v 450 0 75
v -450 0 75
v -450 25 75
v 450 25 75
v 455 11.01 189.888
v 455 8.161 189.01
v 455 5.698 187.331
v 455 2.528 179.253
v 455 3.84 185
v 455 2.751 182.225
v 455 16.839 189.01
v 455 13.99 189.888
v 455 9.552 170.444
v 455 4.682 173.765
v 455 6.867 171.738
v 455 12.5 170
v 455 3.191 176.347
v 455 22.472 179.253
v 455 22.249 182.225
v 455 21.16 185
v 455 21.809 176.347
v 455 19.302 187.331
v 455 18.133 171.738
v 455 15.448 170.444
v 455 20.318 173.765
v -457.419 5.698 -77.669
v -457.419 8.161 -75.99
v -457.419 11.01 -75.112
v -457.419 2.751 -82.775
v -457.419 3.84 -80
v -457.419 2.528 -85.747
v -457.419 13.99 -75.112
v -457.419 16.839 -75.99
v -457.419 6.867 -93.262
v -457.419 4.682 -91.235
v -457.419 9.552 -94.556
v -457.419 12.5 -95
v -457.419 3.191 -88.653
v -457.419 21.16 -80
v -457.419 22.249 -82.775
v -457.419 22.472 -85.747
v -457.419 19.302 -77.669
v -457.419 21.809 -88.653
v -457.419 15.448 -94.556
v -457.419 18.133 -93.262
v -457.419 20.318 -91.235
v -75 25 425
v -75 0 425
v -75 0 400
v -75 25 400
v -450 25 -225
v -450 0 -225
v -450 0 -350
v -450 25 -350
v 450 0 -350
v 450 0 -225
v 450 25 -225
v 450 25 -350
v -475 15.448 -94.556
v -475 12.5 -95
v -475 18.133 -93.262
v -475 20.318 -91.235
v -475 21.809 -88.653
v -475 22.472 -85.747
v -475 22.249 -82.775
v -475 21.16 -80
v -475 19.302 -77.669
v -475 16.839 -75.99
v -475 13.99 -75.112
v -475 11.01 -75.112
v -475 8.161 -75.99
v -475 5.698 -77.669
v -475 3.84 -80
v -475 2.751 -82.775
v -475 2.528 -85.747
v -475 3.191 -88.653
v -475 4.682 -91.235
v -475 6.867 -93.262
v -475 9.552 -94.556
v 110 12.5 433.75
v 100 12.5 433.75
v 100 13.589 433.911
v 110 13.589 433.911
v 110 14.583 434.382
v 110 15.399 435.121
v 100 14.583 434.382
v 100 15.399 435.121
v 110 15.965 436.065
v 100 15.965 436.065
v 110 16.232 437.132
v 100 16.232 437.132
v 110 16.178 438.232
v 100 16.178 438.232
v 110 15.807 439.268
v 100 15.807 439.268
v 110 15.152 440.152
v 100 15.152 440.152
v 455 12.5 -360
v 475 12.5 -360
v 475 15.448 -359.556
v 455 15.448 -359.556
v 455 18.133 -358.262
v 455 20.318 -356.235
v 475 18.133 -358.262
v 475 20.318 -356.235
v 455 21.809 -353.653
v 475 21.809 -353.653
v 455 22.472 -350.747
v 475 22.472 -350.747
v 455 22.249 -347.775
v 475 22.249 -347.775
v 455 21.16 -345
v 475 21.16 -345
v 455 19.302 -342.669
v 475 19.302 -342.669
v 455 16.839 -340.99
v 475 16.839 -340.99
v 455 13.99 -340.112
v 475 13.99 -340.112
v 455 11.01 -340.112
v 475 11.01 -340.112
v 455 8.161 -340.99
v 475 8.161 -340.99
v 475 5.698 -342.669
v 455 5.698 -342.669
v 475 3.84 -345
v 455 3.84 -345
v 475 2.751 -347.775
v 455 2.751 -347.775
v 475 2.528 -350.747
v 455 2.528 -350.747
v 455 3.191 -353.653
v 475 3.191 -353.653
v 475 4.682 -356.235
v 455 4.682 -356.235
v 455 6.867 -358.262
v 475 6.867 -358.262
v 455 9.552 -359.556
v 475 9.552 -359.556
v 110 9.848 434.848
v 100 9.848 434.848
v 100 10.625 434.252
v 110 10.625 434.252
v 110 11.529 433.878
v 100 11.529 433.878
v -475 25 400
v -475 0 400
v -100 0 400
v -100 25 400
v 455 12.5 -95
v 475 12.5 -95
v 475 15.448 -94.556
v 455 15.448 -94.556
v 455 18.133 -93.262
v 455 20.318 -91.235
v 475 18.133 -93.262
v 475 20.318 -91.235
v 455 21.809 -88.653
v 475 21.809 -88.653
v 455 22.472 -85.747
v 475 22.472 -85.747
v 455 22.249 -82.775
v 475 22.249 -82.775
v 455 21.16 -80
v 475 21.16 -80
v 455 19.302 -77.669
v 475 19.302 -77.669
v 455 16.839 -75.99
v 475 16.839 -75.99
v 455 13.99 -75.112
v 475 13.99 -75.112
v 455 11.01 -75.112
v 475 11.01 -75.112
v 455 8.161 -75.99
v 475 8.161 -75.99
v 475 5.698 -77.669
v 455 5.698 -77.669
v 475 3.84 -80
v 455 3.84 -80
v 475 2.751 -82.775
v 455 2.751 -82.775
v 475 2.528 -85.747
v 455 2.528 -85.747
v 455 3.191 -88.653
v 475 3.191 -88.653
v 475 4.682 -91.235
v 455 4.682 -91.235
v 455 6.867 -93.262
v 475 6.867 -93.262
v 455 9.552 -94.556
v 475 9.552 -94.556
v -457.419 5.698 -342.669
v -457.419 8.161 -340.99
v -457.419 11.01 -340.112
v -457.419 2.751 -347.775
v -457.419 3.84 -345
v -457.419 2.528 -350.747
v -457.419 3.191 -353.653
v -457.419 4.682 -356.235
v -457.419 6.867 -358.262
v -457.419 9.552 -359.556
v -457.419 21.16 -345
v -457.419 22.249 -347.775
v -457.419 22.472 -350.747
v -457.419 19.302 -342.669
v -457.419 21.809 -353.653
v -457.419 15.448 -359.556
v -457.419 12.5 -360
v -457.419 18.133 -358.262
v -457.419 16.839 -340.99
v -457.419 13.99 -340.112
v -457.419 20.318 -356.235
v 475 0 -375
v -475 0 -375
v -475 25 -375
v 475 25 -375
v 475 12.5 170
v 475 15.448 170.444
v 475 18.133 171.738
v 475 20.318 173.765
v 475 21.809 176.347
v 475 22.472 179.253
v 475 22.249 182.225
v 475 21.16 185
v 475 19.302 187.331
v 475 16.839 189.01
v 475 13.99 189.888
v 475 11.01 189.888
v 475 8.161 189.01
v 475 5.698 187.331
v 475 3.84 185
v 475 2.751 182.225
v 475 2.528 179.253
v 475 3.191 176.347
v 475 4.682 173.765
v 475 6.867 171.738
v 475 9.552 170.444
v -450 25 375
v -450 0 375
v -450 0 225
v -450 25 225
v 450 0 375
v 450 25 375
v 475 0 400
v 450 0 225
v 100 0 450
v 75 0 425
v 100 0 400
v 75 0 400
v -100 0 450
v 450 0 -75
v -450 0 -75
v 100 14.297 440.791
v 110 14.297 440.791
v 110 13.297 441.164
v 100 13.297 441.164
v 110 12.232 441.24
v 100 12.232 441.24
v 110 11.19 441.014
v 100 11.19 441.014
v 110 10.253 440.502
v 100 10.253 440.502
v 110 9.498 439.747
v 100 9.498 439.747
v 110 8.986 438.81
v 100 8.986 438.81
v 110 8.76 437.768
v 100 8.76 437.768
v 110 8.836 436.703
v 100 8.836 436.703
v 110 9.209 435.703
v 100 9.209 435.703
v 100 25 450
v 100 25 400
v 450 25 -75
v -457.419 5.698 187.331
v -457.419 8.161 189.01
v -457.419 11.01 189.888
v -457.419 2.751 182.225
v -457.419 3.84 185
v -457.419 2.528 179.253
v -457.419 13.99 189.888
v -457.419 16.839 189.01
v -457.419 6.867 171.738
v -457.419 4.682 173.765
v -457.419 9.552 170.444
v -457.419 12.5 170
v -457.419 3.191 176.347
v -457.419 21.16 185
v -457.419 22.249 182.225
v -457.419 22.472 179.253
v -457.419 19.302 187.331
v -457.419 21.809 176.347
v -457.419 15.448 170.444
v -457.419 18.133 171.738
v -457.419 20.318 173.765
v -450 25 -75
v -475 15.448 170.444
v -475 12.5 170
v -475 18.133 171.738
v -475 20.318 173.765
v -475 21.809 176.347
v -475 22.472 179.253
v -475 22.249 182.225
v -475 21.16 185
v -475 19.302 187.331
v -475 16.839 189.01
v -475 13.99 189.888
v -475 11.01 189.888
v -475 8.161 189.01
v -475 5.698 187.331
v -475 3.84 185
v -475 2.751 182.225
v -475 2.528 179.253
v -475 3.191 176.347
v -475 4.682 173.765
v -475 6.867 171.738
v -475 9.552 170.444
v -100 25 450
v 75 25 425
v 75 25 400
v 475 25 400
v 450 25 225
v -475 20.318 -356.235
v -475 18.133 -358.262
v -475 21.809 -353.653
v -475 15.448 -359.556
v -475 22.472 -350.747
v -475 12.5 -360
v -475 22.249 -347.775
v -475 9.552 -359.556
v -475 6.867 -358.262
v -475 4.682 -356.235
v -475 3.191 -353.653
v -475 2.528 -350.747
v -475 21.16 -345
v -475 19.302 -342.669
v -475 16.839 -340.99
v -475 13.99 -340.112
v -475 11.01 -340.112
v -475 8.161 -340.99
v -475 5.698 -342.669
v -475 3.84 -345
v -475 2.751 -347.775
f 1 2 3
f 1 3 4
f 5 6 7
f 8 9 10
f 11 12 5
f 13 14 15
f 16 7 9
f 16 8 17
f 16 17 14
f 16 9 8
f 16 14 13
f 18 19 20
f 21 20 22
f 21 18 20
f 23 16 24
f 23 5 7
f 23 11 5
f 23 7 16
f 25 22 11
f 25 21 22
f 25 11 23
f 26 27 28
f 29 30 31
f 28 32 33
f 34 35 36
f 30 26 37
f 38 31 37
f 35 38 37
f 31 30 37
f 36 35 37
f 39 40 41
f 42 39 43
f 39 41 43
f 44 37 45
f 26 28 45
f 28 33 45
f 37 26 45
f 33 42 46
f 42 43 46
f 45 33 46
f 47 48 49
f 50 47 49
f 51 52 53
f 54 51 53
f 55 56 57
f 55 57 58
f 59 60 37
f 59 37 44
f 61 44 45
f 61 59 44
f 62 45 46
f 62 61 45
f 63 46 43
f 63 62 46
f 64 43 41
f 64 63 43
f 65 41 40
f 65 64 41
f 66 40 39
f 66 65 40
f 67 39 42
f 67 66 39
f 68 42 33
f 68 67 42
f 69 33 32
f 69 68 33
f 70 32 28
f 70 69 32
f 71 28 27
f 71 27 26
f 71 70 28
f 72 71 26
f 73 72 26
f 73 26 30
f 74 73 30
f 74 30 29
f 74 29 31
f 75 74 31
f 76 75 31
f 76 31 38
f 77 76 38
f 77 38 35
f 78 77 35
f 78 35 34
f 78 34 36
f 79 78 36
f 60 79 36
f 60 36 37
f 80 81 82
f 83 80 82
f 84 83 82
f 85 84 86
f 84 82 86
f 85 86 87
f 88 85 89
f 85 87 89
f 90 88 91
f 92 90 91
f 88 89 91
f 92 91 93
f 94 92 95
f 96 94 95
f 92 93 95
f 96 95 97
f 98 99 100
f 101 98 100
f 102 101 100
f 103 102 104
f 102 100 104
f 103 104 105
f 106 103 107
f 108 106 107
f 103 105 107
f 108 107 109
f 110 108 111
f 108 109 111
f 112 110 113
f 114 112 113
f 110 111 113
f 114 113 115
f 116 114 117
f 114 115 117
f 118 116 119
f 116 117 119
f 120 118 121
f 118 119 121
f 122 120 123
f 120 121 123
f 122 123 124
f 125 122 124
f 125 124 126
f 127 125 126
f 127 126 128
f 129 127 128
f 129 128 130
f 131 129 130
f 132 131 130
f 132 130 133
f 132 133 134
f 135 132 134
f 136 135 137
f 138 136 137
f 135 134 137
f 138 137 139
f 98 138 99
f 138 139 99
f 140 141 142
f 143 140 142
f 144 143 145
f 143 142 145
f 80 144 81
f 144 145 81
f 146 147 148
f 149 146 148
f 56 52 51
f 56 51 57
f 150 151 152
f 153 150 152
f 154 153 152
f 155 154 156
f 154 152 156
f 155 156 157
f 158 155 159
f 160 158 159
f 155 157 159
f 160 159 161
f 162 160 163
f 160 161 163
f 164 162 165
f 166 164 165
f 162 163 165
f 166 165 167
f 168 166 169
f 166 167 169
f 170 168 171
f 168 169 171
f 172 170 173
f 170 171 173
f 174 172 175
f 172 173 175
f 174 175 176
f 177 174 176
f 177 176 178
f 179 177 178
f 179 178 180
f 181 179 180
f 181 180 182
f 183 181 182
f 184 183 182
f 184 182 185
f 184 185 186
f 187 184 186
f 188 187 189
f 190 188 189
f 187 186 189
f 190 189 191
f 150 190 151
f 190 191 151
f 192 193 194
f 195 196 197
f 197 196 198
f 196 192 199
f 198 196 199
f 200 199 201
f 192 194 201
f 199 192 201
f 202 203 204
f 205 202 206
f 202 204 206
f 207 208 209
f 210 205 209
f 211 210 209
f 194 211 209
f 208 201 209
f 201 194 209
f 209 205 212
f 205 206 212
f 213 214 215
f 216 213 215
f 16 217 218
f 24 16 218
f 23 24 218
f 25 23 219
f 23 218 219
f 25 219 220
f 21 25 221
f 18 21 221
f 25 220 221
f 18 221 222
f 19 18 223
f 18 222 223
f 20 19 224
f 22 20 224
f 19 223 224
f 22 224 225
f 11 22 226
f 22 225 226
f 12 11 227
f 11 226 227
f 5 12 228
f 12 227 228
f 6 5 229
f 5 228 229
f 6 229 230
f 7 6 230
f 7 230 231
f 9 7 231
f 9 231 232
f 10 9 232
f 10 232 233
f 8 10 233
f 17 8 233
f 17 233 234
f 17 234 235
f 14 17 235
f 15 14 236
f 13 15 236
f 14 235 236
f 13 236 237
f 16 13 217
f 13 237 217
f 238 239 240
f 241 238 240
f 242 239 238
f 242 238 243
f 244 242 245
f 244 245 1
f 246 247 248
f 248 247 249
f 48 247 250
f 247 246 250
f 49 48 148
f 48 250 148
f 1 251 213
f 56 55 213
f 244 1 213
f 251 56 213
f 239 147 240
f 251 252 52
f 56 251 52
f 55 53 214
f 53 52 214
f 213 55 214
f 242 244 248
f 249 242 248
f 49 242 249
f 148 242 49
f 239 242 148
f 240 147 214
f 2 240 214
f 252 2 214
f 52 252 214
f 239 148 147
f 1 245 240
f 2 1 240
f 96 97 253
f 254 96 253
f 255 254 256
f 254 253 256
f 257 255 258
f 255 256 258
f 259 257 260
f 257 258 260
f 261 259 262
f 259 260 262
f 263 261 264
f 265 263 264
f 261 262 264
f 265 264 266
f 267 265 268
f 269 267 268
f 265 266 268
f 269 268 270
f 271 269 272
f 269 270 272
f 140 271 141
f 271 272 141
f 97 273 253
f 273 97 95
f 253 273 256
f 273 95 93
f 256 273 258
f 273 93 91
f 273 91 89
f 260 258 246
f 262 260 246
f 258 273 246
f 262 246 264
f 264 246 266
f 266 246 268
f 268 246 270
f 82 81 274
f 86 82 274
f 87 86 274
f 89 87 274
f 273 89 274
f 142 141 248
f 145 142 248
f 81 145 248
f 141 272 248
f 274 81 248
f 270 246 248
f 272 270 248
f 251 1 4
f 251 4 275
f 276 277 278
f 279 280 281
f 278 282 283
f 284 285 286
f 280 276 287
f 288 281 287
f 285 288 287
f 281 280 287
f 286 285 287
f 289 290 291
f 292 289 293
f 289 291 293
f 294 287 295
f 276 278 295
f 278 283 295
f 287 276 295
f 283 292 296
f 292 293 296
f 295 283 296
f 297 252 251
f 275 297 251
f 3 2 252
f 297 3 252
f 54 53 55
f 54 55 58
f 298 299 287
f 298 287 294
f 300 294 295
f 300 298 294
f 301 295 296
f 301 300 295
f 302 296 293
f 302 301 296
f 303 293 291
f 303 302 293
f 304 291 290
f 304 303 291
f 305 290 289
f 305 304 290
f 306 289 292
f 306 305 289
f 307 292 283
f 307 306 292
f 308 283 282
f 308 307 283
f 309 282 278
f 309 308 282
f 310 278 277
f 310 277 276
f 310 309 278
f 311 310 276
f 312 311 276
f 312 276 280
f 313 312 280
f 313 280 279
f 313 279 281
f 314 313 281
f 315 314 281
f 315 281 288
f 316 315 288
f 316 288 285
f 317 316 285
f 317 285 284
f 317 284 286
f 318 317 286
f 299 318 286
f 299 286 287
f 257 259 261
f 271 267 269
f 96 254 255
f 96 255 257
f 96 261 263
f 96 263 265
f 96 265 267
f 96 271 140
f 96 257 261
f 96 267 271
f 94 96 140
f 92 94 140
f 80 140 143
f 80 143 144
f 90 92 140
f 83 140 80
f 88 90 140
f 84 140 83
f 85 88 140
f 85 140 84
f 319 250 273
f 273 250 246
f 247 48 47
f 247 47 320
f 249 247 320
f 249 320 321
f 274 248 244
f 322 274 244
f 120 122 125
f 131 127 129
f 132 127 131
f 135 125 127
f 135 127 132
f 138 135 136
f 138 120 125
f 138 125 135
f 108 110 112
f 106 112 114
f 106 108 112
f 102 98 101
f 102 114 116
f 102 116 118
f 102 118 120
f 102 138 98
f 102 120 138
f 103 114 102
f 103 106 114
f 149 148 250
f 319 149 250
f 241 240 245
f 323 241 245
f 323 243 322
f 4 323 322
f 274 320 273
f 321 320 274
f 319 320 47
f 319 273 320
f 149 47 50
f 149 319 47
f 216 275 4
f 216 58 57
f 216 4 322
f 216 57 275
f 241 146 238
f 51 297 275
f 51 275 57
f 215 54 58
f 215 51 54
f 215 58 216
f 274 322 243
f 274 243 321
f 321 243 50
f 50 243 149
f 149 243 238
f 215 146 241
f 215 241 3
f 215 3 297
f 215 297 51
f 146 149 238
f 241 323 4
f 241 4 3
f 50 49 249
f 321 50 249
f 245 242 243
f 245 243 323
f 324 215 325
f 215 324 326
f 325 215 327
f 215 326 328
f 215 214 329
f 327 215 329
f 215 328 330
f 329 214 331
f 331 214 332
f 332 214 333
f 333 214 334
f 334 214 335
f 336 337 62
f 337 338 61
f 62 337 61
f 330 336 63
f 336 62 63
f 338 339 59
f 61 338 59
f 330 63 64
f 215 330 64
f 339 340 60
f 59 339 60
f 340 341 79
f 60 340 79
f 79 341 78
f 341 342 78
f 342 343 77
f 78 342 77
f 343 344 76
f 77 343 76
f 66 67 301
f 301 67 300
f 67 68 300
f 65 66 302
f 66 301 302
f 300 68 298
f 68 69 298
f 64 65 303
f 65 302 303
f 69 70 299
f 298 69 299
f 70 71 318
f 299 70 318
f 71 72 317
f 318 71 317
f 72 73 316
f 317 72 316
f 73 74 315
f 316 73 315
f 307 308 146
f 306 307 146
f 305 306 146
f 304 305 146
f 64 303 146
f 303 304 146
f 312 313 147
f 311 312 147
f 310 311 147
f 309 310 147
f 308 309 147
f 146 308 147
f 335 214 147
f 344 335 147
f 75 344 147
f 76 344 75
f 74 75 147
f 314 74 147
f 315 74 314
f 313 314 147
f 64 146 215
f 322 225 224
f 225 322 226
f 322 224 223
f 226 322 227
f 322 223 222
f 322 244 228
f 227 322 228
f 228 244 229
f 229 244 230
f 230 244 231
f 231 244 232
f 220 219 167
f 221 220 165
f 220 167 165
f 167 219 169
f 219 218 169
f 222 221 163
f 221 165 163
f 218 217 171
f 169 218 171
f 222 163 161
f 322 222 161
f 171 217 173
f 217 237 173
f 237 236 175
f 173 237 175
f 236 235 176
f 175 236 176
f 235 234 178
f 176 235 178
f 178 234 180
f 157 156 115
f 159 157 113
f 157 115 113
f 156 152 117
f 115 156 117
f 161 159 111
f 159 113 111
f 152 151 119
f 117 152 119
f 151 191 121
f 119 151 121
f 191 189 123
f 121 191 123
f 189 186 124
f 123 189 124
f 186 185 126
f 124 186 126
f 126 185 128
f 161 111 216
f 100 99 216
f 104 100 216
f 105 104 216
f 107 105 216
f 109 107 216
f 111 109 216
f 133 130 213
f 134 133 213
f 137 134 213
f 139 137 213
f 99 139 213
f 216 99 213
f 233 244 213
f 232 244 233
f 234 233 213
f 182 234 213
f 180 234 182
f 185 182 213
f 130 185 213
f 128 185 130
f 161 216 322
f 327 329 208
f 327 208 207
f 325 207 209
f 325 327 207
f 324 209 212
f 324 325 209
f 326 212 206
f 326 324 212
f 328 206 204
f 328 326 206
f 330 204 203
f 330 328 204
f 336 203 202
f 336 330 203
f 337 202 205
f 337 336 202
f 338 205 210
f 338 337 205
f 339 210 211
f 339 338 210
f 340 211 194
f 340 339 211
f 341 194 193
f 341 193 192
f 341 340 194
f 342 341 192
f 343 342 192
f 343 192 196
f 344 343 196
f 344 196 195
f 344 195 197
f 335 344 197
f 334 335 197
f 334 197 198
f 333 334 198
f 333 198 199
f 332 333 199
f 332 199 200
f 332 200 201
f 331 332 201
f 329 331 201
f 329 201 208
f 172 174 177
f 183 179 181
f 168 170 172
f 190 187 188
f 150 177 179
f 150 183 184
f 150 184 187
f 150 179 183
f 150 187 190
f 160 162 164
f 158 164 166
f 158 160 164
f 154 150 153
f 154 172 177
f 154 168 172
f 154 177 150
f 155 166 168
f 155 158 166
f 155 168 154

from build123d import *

# Parameters (mm, degrees)
CROQUIS1_W              = 150
CROQUIS1_H              = 25
CROQUIS1_W_2            = 900
CROQUIS1_H_2            = 150
SALIENTE_EXTRUIR1_DEPTH = 25
SALIENTE_EXTRUIR2_DEPTH = 10
SALIENTE_EXTRUIR3_REACH = 927
CROQUIS3_W              = 25
CROQUIS3_H              = 25
CROQUIS4_W              = 25
CROQUIS4_H              = 25
CORTAR_EXTRUIR1_DEPTH   = 951
CROQUIS5_R              = 10
CORTAR_EXTRUIR2_DEPTH   = 20


with BuildPart() as part:
    # Croquis1 → Saliente-Extruir1 (new body)
    with BuildSketch(Plane(origin=(0, 0, 0), x_dir=(1, 0, 0), z_dir=(0, 1, 0))):
        Polygon((-100, -450), (100, -450), (100, -400), (475, -400), (475, 400), (-475, 400), (-475, -400), (-100, -400), align=None)
        with Locations((0, -412.5)):
            Rectangle(CROQUIS1_W, CROQUIS1_H, mode=Mode.SUBTRACT)
        with Locations((0, -300)):
            Rectangle(CROQUIS1_W_2, CROQUIS1_H_2, mode=Mode.SUBTRACT)
        Rectangle(CROQUIS1_W_2, CROQUIS1_H_2, mode=Mode.SUBTRACT)
        with Locations((0, 300)):
            Rectangle(CROQUIS1_W_2, CROQUIS1_H_2, mode=Mode.SUBTRACT)
    extrude(amount=SALIENTE_EXTRUIR1_DEPTH)

    # Croquis2 → Saliente-Extruir2 (add)
    with BuildSketch(Plane(origin=(100, 0, 0), x_dir=(0, 0, -1), z_dir=(1, 0, 0))):
        with BuildLine():
            ThreePointArc((-433.75, 12.5), (-436.064937129, 15.964548247), (-440.151650429, 15.151650429))
            Line((-440.151650429, 15.151650429), (-434.848349571, 9.848349571))
            ThreePointArc((-434.848349571, 9.848349571), (-434.035451753, 11.064937129), (-433.75, 12.5))
        make_face()
        with BuildLine():
            Line((-434.848349571, 9.848349571), (-440.151650429, 15.151650429))
            ThreePointArc((-440.151650429, 15.151650429), (-440.151650429, 9.848349571), (-434.848349571, 9.848349571))
        make_face()
    extrude(amount=SALIENTE_EXTRUIR2_DEPTH)

    # Croquis3 → Saliente-Extruir3 (add, up to next)
    with BuildSketch(Plane(origin=(-450, 0, 0), x_dir=(0, 0, -1), z_dir=(1, 0, 0)), mode=Mode.PRIVATE) as saliente_extruir3_sk1:
        with Locations((362.5, 12.5)):
            Rectangle(CROQUIS3_W, CROQUIS3_H)
    saliente_extruir3_tool1 = extrude(saliente_extruir3_sk1.sketch, amount=SALIENTE_EXTRUIR3_REACH, mode=Mode.PRIVATE) - part.part
    add(saliente_extruir3_tool1.solids().sort_by_distance((-450, 12.5, -362.5))[0])

    # Croquis4 → Cortar-Extruir1 (cut, through all)
    with BuildSketch(Plane.ZY.offset(475)):
        with Locations((-387.5, 12.5)):
            Rectangle(CROQUIS4_W, CROQUIS4_H)
    extrude(amount=-CORTAR_EXTRUIR1_DEPTH, mode=Mode.SUBTRACT)

    # Croquis5 → Cortar-Extruir2 (cut)
    with BuildSketch(Plane(origin=(475, 0, 0), x_dir=(0, 0, -1), z_dir=(1, 0, 0))):
        with Locations((350, 12.5)):
            Circle(CROQUIS5_R)
        with Locations((85, 12.5)):
            Circle(CROQUIS5_R)
        with Locations((-180, 12.5)):
            Circle(CROQUIS5_R)
    cortar_extruir2 = extrude(amount=-CORTAR_EXTRUIR2_DEPTH, mode=Mode.SUBTRACT)

    # Simetría1: Cortar-Extruir2 across plane
    add(cortar_extruir2.mirror(Plane(origin=(-1.209663813, -319.213288435, 1311.891688688), x_dir=(0, 0, 1), z_dir=(1, 0, 0))), mode=Mode.SUBTRACT)


solid = part.part
